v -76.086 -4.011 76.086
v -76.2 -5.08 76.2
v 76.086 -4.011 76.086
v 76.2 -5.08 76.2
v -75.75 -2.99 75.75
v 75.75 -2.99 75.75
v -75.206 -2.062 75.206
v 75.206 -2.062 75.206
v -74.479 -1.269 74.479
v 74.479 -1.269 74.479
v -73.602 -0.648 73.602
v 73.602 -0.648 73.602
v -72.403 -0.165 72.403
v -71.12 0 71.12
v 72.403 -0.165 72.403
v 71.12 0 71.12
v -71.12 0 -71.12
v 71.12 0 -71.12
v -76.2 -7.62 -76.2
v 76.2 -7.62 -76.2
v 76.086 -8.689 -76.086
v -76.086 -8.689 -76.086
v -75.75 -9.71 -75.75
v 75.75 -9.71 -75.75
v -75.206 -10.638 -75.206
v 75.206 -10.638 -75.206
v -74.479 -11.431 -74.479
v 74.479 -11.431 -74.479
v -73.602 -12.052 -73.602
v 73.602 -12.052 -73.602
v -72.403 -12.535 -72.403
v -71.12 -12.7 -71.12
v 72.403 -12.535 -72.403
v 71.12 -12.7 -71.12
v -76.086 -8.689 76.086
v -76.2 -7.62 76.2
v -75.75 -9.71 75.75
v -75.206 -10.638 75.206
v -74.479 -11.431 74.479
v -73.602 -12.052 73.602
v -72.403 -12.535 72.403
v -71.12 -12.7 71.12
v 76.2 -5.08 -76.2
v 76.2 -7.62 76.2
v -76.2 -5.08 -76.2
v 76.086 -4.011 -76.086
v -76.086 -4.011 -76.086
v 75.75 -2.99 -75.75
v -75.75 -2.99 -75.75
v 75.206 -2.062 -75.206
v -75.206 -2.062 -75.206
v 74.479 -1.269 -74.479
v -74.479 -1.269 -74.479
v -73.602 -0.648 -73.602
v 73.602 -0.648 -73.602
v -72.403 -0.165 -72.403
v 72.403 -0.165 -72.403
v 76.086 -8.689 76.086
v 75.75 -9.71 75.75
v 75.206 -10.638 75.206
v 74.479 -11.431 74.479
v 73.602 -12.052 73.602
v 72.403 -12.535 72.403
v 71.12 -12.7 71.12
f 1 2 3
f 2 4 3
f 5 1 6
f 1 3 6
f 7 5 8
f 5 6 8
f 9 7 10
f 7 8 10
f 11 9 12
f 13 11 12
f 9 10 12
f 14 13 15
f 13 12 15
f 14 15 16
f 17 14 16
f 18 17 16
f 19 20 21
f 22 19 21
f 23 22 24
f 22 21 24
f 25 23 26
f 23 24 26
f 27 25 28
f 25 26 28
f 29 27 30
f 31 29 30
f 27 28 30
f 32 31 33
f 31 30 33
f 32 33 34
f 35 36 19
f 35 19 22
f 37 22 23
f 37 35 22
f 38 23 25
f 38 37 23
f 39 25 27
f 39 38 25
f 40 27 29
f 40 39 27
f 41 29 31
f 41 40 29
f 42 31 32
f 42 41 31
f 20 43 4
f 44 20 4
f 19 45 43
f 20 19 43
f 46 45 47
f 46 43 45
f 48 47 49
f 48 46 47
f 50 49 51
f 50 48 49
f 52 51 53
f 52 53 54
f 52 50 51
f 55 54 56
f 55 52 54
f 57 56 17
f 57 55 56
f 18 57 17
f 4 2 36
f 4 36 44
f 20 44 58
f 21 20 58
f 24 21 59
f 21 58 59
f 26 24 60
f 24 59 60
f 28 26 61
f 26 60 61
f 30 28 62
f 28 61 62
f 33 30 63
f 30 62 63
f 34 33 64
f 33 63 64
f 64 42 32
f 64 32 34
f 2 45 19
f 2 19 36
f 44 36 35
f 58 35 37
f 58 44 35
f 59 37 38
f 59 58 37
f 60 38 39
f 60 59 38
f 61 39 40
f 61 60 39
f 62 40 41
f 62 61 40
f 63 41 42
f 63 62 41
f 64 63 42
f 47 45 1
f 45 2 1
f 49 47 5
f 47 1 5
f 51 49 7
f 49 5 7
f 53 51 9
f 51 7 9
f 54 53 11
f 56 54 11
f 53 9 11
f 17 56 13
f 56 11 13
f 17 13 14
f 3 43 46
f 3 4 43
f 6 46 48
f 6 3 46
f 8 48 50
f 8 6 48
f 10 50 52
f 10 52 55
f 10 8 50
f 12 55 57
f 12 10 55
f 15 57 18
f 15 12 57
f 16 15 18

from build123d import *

# Parameters (mm, degrees)
F0_W     = 152.4
F0_H     = 152.4
F1_DEPTH = 12.7
F2_R     = 5.08


with BuildPart() as f1:
    # F0 (on Front) → F1 (new body)
    with BuildSketch(Plane.XZ):
        Rectangle(F0_W, F0_H)
    extrude(amount=F1_DEPTH)

    # F2
    f2_edges = [f1.edges().sort_by_distance(p)[0] for p in [
        (76.2, -12.7, 0),
        (0, -12.7, 76.2),
        (-76.2, 0, 0),
        (0, -12.7, -76.2),
        (-76.2, -12.7, 0),
        (0, 0, -76.2),
        (76.2, 0, 0),
        (0, 0, 76.2),
    ]]
    fillet(f2_edges, radius=F2_R)


solid = f1.part
